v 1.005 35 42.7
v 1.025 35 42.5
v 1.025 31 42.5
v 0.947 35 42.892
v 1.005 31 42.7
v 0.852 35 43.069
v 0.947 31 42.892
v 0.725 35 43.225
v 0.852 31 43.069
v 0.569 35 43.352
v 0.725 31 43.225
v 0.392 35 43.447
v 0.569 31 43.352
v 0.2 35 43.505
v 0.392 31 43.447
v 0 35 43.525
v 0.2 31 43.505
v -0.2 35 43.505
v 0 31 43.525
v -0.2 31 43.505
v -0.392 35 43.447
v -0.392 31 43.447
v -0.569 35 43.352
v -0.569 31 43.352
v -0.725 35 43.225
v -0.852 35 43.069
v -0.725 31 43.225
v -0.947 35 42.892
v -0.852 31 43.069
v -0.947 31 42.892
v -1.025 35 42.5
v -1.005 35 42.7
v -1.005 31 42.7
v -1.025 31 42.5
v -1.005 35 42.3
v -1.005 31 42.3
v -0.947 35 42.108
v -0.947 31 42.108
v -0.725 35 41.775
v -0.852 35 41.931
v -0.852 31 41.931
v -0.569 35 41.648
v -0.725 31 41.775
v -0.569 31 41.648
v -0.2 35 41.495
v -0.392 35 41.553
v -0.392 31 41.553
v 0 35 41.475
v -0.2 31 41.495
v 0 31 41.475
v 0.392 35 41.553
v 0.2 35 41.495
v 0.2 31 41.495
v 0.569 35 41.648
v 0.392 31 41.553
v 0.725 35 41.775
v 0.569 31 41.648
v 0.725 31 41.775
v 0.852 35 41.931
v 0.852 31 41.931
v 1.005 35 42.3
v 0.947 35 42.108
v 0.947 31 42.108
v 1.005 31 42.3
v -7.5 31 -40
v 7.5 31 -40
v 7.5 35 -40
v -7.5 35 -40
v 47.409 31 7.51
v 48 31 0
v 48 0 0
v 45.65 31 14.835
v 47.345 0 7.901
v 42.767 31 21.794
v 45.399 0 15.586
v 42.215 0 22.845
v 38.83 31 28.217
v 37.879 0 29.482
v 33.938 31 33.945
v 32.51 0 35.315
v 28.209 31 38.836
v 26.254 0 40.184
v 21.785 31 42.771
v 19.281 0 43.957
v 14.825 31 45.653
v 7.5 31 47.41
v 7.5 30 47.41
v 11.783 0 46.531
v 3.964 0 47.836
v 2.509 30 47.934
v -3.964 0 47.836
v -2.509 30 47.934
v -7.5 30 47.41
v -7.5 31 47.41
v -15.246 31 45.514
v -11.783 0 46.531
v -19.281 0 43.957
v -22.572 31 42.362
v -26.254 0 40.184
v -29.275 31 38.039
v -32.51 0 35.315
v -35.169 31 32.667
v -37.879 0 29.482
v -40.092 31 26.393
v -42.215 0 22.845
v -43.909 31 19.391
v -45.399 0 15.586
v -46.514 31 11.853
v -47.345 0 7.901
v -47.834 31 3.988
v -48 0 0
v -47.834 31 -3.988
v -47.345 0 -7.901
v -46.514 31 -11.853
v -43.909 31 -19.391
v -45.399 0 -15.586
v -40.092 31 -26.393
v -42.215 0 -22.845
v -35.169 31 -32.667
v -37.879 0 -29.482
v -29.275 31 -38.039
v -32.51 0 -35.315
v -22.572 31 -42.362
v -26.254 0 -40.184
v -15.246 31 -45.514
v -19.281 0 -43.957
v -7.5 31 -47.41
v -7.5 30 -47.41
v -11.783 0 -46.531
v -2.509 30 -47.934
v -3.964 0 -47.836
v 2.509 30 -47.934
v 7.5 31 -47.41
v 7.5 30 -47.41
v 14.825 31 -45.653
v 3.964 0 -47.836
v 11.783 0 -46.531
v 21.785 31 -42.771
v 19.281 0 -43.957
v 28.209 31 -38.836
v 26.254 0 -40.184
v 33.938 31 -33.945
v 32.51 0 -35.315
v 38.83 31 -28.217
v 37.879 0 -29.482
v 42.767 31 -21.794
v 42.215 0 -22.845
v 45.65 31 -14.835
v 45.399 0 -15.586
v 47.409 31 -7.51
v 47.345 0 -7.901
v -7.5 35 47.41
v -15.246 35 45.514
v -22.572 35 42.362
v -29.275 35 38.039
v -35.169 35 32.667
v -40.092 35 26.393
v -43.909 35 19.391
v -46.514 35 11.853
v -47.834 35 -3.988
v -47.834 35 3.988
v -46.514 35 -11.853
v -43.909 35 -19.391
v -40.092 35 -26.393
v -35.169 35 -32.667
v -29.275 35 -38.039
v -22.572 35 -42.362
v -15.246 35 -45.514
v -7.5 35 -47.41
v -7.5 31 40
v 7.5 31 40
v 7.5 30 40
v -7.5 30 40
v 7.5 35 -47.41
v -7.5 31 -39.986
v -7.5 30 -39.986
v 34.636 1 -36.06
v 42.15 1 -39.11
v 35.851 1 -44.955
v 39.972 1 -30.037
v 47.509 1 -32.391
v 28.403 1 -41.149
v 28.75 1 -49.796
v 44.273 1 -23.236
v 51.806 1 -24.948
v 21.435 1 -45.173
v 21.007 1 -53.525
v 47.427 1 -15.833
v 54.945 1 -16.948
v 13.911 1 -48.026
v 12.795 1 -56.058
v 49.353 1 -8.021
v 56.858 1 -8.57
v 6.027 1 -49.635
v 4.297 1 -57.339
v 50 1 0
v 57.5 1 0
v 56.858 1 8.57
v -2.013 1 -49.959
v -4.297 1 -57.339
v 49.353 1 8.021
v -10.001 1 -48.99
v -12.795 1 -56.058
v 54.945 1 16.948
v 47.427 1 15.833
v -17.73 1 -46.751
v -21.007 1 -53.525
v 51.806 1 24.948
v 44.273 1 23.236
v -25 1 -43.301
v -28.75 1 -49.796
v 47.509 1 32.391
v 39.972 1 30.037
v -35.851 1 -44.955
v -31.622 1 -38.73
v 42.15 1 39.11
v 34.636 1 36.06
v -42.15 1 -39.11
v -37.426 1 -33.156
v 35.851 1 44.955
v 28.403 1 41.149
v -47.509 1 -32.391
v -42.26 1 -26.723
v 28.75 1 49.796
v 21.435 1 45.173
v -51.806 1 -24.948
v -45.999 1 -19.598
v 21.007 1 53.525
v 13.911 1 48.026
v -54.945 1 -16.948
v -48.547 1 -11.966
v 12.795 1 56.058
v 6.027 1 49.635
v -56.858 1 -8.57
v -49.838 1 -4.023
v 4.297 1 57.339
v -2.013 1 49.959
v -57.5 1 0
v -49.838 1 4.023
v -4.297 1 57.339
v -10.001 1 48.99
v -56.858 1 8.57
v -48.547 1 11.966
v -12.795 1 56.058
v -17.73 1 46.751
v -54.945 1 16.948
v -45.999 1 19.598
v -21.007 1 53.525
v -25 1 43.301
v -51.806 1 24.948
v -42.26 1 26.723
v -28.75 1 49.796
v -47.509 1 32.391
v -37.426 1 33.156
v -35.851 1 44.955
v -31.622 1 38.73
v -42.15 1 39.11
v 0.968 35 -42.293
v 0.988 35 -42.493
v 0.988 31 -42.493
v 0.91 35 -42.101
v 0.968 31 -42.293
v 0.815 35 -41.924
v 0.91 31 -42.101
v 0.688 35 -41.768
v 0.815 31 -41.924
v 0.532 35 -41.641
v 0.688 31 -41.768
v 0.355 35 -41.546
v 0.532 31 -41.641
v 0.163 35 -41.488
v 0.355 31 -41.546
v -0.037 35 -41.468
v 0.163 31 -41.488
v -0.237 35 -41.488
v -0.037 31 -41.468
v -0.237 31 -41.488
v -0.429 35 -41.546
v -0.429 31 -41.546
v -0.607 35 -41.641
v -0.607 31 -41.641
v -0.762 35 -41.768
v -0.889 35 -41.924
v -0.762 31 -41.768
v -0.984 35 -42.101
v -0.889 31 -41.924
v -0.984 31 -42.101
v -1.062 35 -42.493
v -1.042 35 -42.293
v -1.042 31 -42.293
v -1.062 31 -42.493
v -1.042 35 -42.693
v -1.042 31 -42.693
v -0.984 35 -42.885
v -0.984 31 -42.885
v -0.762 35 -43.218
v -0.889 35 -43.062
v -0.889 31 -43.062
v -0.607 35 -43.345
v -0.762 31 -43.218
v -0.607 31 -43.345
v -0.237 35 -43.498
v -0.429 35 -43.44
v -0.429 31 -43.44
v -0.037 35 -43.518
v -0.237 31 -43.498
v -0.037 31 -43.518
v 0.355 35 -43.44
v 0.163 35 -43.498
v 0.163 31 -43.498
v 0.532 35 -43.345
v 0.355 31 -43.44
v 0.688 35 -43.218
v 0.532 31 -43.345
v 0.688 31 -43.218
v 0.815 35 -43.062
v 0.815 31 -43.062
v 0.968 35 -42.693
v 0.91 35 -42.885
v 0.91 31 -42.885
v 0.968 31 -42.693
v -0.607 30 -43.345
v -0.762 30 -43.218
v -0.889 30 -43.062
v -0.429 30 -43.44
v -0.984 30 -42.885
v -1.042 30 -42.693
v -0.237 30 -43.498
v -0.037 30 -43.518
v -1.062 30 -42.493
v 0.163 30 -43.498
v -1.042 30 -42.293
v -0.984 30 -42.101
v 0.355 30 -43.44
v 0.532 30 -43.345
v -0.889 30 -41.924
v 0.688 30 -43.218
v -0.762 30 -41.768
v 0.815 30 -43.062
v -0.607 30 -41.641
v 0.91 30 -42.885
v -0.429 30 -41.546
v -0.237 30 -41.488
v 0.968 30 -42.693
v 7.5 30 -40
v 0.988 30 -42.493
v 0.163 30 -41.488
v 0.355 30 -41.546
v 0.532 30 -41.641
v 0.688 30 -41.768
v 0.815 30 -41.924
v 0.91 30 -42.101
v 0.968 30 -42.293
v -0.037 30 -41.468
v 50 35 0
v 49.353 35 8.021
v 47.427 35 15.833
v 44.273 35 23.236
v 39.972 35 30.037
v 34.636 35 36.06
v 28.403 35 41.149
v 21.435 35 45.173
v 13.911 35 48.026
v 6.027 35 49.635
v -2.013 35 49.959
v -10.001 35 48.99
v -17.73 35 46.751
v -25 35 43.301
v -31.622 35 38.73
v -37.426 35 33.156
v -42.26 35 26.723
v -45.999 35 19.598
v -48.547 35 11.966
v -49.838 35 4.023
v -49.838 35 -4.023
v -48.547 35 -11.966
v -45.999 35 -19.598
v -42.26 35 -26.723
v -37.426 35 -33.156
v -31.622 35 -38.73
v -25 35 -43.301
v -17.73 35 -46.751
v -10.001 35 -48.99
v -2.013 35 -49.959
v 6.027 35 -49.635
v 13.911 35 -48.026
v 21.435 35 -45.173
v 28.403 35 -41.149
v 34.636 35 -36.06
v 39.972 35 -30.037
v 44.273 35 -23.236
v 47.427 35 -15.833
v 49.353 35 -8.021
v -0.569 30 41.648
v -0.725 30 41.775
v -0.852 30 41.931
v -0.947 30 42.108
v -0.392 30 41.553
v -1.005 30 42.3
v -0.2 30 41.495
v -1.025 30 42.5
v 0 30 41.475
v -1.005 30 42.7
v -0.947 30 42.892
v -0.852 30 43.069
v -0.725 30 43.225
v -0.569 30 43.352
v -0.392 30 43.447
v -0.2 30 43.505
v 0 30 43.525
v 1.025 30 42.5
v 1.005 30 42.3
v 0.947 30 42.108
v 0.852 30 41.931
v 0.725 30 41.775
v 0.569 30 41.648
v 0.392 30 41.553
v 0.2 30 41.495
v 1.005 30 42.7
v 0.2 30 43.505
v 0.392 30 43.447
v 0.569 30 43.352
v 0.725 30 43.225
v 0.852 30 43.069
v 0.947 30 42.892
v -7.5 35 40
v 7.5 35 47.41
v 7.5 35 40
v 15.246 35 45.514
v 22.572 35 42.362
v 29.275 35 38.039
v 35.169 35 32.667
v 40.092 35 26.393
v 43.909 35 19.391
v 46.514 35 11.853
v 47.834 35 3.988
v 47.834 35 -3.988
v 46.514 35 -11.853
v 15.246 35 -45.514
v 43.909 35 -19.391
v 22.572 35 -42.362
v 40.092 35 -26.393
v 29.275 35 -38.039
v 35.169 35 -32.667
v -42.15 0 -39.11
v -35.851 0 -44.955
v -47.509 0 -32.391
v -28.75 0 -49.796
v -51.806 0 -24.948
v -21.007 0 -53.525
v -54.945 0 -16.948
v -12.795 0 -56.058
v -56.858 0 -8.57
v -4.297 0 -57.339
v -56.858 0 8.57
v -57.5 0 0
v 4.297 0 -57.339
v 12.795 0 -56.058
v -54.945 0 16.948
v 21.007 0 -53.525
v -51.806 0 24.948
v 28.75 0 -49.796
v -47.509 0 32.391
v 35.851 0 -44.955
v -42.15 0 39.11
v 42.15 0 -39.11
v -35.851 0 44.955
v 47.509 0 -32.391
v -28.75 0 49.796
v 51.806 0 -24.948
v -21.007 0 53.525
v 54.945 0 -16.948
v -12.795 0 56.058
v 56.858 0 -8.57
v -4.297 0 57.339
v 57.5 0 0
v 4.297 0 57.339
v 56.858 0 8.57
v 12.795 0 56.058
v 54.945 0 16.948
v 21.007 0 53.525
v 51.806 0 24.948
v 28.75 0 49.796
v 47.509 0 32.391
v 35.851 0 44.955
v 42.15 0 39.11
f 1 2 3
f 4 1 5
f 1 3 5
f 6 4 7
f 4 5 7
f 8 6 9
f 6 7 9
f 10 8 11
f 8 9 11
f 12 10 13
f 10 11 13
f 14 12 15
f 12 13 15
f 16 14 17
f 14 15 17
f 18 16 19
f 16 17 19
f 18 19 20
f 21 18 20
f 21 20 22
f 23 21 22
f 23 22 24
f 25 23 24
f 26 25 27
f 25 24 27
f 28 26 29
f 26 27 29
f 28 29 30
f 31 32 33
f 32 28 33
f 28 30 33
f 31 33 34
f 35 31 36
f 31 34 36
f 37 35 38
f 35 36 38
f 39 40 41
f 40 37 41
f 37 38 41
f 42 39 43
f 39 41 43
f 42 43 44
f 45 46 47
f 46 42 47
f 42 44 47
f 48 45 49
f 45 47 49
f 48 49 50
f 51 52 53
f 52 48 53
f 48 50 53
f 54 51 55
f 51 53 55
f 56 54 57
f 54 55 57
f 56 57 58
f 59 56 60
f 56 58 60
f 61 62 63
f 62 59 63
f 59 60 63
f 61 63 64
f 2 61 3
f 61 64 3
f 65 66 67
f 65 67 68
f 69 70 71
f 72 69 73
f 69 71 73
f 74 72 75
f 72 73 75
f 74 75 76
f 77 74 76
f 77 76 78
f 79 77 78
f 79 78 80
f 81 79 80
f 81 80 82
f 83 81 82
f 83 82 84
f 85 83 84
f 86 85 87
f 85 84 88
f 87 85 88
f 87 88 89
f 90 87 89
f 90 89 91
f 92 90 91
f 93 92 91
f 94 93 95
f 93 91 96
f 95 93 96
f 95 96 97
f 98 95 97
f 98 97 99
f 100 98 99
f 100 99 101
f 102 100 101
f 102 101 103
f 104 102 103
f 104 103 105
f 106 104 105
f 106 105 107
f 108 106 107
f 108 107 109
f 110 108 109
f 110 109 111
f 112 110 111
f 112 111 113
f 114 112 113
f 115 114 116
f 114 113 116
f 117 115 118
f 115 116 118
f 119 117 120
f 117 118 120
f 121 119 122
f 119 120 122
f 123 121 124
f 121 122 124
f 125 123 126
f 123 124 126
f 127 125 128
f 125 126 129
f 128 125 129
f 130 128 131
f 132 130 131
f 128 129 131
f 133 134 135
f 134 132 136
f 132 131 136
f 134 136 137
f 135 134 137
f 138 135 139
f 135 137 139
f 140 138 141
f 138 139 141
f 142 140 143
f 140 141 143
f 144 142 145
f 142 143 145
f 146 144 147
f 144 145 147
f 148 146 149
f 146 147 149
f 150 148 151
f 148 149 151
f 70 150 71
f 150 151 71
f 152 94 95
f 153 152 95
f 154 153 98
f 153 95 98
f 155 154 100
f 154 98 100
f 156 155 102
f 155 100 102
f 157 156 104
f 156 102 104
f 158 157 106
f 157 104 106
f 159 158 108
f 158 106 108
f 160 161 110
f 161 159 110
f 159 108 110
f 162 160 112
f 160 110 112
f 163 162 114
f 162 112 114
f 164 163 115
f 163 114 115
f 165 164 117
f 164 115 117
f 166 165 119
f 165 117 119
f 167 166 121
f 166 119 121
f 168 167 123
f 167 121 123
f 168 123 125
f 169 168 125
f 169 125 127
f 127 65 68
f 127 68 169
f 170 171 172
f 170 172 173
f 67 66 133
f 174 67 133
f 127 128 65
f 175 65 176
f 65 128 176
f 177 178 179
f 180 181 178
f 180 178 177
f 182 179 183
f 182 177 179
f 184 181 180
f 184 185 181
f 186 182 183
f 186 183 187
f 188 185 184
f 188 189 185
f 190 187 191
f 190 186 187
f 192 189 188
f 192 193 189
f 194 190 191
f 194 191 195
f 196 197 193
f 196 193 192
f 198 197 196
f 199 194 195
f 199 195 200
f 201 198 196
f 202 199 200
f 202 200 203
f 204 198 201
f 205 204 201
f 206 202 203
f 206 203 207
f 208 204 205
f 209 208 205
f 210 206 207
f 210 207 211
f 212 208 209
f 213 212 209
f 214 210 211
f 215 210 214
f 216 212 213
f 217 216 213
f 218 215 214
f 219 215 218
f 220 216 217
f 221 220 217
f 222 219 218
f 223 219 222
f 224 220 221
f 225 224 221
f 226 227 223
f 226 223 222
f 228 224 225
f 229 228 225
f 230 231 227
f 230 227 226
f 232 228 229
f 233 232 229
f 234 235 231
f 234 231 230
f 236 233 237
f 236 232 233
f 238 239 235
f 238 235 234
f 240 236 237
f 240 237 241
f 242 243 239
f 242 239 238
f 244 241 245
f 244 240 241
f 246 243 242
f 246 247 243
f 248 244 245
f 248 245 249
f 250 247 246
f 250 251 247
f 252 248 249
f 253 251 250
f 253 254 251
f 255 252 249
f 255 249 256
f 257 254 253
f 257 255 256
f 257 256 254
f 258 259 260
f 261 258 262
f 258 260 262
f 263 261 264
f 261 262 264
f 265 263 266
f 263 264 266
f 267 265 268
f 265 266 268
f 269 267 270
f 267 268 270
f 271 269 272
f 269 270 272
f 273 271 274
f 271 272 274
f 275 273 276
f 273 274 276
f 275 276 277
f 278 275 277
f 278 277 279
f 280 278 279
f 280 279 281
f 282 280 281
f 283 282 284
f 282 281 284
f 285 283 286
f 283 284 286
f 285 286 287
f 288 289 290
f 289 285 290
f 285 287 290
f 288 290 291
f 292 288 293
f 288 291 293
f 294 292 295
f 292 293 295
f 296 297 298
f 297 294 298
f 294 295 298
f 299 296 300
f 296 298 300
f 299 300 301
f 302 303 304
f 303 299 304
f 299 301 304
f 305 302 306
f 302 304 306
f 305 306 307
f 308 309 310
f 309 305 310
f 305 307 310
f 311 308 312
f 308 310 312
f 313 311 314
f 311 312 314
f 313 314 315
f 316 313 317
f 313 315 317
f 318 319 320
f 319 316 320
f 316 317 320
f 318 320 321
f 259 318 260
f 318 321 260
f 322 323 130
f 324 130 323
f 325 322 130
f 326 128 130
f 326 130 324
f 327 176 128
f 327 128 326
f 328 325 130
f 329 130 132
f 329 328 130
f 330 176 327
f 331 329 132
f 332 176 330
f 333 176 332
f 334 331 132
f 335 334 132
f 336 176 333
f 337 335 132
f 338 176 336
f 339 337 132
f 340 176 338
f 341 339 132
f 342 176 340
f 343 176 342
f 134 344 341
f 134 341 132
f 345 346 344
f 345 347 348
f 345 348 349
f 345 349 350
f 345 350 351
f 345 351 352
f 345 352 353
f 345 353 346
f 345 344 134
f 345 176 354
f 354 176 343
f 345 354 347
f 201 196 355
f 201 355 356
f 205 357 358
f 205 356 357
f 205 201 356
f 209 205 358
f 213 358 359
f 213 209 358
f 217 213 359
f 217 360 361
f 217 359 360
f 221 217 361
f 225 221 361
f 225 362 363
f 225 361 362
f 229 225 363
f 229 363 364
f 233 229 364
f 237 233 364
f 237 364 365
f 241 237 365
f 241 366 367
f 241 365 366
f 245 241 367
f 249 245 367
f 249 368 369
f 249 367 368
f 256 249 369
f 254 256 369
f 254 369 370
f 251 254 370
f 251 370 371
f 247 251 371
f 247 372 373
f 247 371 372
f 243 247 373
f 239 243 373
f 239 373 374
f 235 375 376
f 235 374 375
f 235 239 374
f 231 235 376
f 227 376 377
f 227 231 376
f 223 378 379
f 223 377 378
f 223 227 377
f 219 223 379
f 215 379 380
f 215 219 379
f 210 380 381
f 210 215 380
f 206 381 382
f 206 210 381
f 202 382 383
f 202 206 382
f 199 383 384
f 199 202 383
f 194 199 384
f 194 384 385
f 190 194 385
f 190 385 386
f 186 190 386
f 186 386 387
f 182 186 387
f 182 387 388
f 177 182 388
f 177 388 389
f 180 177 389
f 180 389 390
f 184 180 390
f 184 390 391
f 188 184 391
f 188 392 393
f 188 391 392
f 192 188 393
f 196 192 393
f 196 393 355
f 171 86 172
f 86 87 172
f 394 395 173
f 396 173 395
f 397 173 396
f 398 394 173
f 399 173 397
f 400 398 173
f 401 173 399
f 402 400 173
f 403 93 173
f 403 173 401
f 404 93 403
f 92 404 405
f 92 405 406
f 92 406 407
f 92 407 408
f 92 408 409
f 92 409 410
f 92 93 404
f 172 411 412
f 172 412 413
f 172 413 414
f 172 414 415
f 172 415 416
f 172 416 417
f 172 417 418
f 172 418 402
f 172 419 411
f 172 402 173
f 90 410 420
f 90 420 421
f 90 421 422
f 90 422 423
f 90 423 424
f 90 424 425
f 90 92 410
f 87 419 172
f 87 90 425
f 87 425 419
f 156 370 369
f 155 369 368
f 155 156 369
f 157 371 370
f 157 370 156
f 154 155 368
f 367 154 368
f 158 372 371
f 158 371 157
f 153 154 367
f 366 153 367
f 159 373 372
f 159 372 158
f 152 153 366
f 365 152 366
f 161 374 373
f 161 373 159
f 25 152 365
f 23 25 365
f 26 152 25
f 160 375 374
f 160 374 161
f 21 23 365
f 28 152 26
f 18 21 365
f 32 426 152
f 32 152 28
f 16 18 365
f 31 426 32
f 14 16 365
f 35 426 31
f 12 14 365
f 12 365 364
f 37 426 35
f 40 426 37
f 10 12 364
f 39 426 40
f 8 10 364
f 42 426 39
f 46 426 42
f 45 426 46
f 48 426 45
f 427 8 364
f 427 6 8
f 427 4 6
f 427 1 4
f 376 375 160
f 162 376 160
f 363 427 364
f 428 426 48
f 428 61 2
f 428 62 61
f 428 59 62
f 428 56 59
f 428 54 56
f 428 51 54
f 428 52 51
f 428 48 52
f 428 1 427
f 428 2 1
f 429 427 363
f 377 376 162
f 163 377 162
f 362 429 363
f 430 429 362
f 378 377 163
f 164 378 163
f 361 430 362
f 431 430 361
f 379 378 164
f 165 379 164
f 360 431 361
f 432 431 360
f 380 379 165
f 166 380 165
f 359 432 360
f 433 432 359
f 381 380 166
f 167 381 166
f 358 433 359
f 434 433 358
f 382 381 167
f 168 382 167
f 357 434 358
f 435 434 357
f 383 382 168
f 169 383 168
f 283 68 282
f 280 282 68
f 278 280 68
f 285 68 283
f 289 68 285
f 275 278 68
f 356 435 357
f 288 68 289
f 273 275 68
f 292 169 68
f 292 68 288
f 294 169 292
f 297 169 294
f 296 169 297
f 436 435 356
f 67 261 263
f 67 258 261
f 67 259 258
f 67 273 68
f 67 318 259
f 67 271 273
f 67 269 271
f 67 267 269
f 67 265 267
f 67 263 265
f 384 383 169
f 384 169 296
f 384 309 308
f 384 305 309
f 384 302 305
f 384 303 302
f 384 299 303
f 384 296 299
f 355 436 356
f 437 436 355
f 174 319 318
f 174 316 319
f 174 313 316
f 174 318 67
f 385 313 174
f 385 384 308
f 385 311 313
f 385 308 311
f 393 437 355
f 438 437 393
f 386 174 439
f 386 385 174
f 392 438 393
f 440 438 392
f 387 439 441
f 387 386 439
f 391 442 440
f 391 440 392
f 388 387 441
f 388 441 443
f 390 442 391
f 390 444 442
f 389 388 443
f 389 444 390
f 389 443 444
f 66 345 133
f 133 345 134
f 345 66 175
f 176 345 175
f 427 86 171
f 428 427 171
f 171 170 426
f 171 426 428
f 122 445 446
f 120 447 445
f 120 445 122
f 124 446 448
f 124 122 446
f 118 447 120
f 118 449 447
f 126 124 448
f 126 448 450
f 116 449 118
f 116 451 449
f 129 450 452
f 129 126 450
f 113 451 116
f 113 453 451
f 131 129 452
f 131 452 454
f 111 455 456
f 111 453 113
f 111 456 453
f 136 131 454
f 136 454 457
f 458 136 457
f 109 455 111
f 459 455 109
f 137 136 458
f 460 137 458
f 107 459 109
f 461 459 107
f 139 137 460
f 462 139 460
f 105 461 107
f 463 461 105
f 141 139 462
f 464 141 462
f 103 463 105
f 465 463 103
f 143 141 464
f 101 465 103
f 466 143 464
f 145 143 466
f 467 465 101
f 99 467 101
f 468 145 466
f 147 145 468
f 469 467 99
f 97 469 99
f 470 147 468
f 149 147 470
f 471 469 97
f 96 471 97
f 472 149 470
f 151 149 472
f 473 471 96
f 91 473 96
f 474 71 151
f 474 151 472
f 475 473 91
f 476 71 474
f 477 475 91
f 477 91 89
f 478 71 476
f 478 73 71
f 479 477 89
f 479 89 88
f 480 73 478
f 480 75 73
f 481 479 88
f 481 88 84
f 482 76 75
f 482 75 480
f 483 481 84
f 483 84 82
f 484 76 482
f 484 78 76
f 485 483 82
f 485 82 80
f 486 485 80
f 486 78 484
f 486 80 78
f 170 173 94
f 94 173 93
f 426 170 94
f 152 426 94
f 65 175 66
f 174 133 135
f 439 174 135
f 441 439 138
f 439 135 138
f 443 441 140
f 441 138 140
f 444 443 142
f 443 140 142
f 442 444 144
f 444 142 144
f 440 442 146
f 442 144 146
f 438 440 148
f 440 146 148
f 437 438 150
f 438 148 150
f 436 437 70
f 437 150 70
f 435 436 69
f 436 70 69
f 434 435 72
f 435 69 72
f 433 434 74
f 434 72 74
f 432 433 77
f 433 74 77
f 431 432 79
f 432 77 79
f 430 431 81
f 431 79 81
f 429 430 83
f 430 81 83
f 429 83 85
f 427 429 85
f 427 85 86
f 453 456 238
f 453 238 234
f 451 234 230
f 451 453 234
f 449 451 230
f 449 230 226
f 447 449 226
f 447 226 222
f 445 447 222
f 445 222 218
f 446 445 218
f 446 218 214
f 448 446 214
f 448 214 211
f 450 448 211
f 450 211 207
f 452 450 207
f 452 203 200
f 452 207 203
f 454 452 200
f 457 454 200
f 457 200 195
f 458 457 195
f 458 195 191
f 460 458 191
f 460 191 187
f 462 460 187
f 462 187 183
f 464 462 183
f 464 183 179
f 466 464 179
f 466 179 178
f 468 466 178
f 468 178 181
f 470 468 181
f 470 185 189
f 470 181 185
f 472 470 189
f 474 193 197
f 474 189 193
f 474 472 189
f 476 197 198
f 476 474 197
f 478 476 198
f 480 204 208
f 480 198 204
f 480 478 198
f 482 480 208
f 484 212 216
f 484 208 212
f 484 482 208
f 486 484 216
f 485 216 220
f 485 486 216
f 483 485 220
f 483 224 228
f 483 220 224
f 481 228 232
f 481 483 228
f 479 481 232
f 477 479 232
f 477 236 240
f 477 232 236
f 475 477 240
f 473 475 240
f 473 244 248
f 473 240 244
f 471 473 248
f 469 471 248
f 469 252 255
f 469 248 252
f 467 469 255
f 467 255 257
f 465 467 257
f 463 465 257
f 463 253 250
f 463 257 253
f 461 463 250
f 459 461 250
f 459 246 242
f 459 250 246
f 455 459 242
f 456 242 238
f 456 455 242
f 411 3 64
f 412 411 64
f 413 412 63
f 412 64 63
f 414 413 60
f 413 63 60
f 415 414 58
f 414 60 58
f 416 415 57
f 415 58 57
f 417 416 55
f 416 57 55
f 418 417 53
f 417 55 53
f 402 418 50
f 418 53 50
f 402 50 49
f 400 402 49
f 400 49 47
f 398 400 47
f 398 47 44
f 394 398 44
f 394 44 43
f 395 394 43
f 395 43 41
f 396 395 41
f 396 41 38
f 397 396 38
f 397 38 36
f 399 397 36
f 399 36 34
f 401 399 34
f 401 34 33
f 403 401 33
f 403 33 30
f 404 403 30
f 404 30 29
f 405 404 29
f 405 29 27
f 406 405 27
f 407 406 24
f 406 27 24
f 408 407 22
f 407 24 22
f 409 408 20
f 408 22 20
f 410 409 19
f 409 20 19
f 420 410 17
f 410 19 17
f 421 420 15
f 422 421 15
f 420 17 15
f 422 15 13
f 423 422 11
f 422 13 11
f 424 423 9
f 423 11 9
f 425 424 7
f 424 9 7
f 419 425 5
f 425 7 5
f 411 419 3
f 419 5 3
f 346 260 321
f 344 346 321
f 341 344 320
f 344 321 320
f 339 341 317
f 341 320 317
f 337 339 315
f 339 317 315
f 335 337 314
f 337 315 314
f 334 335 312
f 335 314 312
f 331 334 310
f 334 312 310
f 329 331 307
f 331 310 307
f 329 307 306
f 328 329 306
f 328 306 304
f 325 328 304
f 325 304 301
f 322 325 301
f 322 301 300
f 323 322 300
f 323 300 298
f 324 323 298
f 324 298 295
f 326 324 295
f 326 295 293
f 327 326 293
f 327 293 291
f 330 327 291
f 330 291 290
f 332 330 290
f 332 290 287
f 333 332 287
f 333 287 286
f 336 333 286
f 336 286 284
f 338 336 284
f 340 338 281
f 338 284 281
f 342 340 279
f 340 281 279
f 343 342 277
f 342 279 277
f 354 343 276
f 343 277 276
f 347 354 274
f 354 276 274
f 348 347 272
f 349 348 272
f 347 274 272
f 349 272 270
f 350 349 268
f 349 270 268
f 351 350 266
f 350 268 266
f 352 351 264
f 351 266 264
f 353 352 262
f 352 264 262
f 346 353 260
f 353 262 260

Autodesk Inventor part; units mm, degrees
ref_plane "YZ Plane" through (0, 0, 0) normal (1, 0, 0) x (0, 1, 0)
ref_plane "XZ Plane" through (0, 0, 0) normal (0, 1, 0) x (-1, 0, 0)
ref_plane "XY Plane" through (0, 0, 0) normal (0, 0, 1) x (1, 0, 0)
sketch "Sketch1" plane through (0, 0, 0) normal (0, 1, 0) x (-1, 0, 0)
  circle A0 centre (0, 0) radius 57.5
  circle A1 centre (0, 0) radius 48
  circle A2 centre (0, 0) radius 50
  line L0 (0, 0) -> (7.5, 0)
  line L1 (7.5, 0) -> (-7.5, 0)
  line L2 (-7.5, 0) -> (-7.5, -47.4104)
  line L3 (7.5, 0) -> (7.5, -47.4104)
  line L4 (7.5, 0) -> (7.5, 47.4104)
  line L5 (-7.5, 0) -> (-7.5, 47.4104)
  dimension "d0" = 115
  dimension "d1" = 96
  dimension "d2" = 100
extrude "Extrusion1" add sketch "Sketch1" along normal blind 1 contours A0 | A1 L3 L4 | L4 L0 L1 L5 A1 | A1 L2 L1 L0 L3 | L5 L2 A1 | A2
sketch "Sketch2" plane through (0, 1, 0) normal (0, 1, 0) x (1, 0, 0)
  circle A0 centre (0, 0) radius 49
  circle A1 centre (0, 0) radius 50
  line L0 (0, 0) -> (7.5, 0)
  line L1 (7.5, -48.4226) -> (7.5, 48.4226) projected
  line L2 (7.5, 0) -> (7.5, 48.4226)
  line L3 (7.5, 48.4226) -> (7.5, -48.4226)
  line L4 (-7.5, 48.4226) -> (-7.5, -48.4226)
  dimension "d7" = 98
  dimension "d8" = 100
extrude "Extrusion2" add sketch "Sketch2" along normal blind 30 contours L1 A0 L4 | A1
sketch "Sketch3" plane through (0, 0, 0) normal (0, -1, 0) x (1, 0, 0)
  circle A0 centre (0, 0) radius 49
  line L0 (0, 0) -> (0, 40)
  line L1 (0, 40) -> (0, -40)
  dimension "d11" = 98
  dimension "d12" = 40
  dimension "d13" = 80
extrude "Extrusion3" cut sketch "Sketch3" against normal blind 30
sketch "Sketch4" plane through (0, 31, 0) normal (0, 1, 0) x (1, 0, 0)
  line L0 (0, 0) -> (0, -40)
  line L1 (0, -40) -> (-7.5, -40)
  line L2 (-7.5, 48.4226) -> (-7.5, -48.4226) projected
  line L3 (7.5742, -40) -> (0, -40)
  line L4 (7.5742, -40) -> (7.5, 40)
  line L5 (7.5, -48.4226) -> (7.5, 48.4226) projected
  line L6 (7.5, 40) -> (-7.5742, 39.986)
  line L7 (-7.5742, 39.986) -> (-7.5, -40)
  line L8 (-7.5, -40) -> (-7.5742, 39.986)
  line L9 (0, -40) -> (0, -42.5)
  line L10 (-0.0371, 39.993) -> (-0.0371, 42.493)
  circle A0 centre (-0.0371, 42.493) radius 1.025
  circle A1 centre (0, -42.5) radius 1.025
  point P0 (-7.5, 39.9861)
  point P1 (7.5, -40)
  dimension "d16" = 40
  dimension "d17" = 80
  dimension "d18" = 2.5
  dimension "d19" = 2.5
  dimension "d20" = 2.05
  dimension "d21" = 2.05
extrude "Extrusion4" cut sketch "Sketch4" against normal through all contours L1 L2 L6 L5 L3 | A0 | A1
sketch "Sketch5" plane through (0, 0, 0) normal (0, -1, 0) x (1, 0, 0)
  circle A0 centre (0, 0) radius 49
  circle A1 centre (0, 0) radius 48
  dimension "d24" = 98
  dimension "d25" = 96
extrude "Extrusion5" add sketch "Sketch5" against normal blind 31
sketch "Sketch6" plane through (0, 31, 0) normal (0, 1, 0) x (1, 0, 0)
  circle A0 centre (0, 0) radius 50
  circle A1 centre (0, -42.5) radius 1.025 projected
  circle A2 centre (0, -42.5) radius 1.025
  line L0 (-7.5, -40) -> (-7.5, -47.4104) projected
  line L1 (-7.5, -47.4104) -> (-7.5, -40)
  line L2 (7.5, -47.4104) -> (7.5, -40) projected
  line L3 (-7.5, -40) -> (7.5, -40)
  line L4 (7.5, -40) -> (-7.5, -40)
  line L5 (-7.5, -47.4104) -> (-7.5, -40)
  line L6 (7.5, -40) -> (-7.5, -40)
  arc A3 (7.5, -47.4104) -> (7.5, 47.4104) centre (0, 0) ccw
  arc A4 (-7.5, 47.4104) -> (-7.5, -47.4104) centre (0, 0) ccw
  line L7 (7.5, 40) -> (7.5, 47.4104) projected
  line L8 (7.5, 47.4104) -> (7.5, 40)
  line L9 (7.5, 40) -> (-7.5, 40)
  line L10 (-7.5, 40) -> (-7.5, 47.4104)
  circle A5 centre (-0.0371, 42.493) radius 1.025 projected
  circle A6 centre (-0.0371, 42.493) radius 1.025
  dimension "d28" = 100
  dimension "d30" = 2.05
  dimension "d31" = 2.05
extrude "Extrusion6" add sketch "Sketch6" along normal blind 4
properties part number "Chassis_Support"
